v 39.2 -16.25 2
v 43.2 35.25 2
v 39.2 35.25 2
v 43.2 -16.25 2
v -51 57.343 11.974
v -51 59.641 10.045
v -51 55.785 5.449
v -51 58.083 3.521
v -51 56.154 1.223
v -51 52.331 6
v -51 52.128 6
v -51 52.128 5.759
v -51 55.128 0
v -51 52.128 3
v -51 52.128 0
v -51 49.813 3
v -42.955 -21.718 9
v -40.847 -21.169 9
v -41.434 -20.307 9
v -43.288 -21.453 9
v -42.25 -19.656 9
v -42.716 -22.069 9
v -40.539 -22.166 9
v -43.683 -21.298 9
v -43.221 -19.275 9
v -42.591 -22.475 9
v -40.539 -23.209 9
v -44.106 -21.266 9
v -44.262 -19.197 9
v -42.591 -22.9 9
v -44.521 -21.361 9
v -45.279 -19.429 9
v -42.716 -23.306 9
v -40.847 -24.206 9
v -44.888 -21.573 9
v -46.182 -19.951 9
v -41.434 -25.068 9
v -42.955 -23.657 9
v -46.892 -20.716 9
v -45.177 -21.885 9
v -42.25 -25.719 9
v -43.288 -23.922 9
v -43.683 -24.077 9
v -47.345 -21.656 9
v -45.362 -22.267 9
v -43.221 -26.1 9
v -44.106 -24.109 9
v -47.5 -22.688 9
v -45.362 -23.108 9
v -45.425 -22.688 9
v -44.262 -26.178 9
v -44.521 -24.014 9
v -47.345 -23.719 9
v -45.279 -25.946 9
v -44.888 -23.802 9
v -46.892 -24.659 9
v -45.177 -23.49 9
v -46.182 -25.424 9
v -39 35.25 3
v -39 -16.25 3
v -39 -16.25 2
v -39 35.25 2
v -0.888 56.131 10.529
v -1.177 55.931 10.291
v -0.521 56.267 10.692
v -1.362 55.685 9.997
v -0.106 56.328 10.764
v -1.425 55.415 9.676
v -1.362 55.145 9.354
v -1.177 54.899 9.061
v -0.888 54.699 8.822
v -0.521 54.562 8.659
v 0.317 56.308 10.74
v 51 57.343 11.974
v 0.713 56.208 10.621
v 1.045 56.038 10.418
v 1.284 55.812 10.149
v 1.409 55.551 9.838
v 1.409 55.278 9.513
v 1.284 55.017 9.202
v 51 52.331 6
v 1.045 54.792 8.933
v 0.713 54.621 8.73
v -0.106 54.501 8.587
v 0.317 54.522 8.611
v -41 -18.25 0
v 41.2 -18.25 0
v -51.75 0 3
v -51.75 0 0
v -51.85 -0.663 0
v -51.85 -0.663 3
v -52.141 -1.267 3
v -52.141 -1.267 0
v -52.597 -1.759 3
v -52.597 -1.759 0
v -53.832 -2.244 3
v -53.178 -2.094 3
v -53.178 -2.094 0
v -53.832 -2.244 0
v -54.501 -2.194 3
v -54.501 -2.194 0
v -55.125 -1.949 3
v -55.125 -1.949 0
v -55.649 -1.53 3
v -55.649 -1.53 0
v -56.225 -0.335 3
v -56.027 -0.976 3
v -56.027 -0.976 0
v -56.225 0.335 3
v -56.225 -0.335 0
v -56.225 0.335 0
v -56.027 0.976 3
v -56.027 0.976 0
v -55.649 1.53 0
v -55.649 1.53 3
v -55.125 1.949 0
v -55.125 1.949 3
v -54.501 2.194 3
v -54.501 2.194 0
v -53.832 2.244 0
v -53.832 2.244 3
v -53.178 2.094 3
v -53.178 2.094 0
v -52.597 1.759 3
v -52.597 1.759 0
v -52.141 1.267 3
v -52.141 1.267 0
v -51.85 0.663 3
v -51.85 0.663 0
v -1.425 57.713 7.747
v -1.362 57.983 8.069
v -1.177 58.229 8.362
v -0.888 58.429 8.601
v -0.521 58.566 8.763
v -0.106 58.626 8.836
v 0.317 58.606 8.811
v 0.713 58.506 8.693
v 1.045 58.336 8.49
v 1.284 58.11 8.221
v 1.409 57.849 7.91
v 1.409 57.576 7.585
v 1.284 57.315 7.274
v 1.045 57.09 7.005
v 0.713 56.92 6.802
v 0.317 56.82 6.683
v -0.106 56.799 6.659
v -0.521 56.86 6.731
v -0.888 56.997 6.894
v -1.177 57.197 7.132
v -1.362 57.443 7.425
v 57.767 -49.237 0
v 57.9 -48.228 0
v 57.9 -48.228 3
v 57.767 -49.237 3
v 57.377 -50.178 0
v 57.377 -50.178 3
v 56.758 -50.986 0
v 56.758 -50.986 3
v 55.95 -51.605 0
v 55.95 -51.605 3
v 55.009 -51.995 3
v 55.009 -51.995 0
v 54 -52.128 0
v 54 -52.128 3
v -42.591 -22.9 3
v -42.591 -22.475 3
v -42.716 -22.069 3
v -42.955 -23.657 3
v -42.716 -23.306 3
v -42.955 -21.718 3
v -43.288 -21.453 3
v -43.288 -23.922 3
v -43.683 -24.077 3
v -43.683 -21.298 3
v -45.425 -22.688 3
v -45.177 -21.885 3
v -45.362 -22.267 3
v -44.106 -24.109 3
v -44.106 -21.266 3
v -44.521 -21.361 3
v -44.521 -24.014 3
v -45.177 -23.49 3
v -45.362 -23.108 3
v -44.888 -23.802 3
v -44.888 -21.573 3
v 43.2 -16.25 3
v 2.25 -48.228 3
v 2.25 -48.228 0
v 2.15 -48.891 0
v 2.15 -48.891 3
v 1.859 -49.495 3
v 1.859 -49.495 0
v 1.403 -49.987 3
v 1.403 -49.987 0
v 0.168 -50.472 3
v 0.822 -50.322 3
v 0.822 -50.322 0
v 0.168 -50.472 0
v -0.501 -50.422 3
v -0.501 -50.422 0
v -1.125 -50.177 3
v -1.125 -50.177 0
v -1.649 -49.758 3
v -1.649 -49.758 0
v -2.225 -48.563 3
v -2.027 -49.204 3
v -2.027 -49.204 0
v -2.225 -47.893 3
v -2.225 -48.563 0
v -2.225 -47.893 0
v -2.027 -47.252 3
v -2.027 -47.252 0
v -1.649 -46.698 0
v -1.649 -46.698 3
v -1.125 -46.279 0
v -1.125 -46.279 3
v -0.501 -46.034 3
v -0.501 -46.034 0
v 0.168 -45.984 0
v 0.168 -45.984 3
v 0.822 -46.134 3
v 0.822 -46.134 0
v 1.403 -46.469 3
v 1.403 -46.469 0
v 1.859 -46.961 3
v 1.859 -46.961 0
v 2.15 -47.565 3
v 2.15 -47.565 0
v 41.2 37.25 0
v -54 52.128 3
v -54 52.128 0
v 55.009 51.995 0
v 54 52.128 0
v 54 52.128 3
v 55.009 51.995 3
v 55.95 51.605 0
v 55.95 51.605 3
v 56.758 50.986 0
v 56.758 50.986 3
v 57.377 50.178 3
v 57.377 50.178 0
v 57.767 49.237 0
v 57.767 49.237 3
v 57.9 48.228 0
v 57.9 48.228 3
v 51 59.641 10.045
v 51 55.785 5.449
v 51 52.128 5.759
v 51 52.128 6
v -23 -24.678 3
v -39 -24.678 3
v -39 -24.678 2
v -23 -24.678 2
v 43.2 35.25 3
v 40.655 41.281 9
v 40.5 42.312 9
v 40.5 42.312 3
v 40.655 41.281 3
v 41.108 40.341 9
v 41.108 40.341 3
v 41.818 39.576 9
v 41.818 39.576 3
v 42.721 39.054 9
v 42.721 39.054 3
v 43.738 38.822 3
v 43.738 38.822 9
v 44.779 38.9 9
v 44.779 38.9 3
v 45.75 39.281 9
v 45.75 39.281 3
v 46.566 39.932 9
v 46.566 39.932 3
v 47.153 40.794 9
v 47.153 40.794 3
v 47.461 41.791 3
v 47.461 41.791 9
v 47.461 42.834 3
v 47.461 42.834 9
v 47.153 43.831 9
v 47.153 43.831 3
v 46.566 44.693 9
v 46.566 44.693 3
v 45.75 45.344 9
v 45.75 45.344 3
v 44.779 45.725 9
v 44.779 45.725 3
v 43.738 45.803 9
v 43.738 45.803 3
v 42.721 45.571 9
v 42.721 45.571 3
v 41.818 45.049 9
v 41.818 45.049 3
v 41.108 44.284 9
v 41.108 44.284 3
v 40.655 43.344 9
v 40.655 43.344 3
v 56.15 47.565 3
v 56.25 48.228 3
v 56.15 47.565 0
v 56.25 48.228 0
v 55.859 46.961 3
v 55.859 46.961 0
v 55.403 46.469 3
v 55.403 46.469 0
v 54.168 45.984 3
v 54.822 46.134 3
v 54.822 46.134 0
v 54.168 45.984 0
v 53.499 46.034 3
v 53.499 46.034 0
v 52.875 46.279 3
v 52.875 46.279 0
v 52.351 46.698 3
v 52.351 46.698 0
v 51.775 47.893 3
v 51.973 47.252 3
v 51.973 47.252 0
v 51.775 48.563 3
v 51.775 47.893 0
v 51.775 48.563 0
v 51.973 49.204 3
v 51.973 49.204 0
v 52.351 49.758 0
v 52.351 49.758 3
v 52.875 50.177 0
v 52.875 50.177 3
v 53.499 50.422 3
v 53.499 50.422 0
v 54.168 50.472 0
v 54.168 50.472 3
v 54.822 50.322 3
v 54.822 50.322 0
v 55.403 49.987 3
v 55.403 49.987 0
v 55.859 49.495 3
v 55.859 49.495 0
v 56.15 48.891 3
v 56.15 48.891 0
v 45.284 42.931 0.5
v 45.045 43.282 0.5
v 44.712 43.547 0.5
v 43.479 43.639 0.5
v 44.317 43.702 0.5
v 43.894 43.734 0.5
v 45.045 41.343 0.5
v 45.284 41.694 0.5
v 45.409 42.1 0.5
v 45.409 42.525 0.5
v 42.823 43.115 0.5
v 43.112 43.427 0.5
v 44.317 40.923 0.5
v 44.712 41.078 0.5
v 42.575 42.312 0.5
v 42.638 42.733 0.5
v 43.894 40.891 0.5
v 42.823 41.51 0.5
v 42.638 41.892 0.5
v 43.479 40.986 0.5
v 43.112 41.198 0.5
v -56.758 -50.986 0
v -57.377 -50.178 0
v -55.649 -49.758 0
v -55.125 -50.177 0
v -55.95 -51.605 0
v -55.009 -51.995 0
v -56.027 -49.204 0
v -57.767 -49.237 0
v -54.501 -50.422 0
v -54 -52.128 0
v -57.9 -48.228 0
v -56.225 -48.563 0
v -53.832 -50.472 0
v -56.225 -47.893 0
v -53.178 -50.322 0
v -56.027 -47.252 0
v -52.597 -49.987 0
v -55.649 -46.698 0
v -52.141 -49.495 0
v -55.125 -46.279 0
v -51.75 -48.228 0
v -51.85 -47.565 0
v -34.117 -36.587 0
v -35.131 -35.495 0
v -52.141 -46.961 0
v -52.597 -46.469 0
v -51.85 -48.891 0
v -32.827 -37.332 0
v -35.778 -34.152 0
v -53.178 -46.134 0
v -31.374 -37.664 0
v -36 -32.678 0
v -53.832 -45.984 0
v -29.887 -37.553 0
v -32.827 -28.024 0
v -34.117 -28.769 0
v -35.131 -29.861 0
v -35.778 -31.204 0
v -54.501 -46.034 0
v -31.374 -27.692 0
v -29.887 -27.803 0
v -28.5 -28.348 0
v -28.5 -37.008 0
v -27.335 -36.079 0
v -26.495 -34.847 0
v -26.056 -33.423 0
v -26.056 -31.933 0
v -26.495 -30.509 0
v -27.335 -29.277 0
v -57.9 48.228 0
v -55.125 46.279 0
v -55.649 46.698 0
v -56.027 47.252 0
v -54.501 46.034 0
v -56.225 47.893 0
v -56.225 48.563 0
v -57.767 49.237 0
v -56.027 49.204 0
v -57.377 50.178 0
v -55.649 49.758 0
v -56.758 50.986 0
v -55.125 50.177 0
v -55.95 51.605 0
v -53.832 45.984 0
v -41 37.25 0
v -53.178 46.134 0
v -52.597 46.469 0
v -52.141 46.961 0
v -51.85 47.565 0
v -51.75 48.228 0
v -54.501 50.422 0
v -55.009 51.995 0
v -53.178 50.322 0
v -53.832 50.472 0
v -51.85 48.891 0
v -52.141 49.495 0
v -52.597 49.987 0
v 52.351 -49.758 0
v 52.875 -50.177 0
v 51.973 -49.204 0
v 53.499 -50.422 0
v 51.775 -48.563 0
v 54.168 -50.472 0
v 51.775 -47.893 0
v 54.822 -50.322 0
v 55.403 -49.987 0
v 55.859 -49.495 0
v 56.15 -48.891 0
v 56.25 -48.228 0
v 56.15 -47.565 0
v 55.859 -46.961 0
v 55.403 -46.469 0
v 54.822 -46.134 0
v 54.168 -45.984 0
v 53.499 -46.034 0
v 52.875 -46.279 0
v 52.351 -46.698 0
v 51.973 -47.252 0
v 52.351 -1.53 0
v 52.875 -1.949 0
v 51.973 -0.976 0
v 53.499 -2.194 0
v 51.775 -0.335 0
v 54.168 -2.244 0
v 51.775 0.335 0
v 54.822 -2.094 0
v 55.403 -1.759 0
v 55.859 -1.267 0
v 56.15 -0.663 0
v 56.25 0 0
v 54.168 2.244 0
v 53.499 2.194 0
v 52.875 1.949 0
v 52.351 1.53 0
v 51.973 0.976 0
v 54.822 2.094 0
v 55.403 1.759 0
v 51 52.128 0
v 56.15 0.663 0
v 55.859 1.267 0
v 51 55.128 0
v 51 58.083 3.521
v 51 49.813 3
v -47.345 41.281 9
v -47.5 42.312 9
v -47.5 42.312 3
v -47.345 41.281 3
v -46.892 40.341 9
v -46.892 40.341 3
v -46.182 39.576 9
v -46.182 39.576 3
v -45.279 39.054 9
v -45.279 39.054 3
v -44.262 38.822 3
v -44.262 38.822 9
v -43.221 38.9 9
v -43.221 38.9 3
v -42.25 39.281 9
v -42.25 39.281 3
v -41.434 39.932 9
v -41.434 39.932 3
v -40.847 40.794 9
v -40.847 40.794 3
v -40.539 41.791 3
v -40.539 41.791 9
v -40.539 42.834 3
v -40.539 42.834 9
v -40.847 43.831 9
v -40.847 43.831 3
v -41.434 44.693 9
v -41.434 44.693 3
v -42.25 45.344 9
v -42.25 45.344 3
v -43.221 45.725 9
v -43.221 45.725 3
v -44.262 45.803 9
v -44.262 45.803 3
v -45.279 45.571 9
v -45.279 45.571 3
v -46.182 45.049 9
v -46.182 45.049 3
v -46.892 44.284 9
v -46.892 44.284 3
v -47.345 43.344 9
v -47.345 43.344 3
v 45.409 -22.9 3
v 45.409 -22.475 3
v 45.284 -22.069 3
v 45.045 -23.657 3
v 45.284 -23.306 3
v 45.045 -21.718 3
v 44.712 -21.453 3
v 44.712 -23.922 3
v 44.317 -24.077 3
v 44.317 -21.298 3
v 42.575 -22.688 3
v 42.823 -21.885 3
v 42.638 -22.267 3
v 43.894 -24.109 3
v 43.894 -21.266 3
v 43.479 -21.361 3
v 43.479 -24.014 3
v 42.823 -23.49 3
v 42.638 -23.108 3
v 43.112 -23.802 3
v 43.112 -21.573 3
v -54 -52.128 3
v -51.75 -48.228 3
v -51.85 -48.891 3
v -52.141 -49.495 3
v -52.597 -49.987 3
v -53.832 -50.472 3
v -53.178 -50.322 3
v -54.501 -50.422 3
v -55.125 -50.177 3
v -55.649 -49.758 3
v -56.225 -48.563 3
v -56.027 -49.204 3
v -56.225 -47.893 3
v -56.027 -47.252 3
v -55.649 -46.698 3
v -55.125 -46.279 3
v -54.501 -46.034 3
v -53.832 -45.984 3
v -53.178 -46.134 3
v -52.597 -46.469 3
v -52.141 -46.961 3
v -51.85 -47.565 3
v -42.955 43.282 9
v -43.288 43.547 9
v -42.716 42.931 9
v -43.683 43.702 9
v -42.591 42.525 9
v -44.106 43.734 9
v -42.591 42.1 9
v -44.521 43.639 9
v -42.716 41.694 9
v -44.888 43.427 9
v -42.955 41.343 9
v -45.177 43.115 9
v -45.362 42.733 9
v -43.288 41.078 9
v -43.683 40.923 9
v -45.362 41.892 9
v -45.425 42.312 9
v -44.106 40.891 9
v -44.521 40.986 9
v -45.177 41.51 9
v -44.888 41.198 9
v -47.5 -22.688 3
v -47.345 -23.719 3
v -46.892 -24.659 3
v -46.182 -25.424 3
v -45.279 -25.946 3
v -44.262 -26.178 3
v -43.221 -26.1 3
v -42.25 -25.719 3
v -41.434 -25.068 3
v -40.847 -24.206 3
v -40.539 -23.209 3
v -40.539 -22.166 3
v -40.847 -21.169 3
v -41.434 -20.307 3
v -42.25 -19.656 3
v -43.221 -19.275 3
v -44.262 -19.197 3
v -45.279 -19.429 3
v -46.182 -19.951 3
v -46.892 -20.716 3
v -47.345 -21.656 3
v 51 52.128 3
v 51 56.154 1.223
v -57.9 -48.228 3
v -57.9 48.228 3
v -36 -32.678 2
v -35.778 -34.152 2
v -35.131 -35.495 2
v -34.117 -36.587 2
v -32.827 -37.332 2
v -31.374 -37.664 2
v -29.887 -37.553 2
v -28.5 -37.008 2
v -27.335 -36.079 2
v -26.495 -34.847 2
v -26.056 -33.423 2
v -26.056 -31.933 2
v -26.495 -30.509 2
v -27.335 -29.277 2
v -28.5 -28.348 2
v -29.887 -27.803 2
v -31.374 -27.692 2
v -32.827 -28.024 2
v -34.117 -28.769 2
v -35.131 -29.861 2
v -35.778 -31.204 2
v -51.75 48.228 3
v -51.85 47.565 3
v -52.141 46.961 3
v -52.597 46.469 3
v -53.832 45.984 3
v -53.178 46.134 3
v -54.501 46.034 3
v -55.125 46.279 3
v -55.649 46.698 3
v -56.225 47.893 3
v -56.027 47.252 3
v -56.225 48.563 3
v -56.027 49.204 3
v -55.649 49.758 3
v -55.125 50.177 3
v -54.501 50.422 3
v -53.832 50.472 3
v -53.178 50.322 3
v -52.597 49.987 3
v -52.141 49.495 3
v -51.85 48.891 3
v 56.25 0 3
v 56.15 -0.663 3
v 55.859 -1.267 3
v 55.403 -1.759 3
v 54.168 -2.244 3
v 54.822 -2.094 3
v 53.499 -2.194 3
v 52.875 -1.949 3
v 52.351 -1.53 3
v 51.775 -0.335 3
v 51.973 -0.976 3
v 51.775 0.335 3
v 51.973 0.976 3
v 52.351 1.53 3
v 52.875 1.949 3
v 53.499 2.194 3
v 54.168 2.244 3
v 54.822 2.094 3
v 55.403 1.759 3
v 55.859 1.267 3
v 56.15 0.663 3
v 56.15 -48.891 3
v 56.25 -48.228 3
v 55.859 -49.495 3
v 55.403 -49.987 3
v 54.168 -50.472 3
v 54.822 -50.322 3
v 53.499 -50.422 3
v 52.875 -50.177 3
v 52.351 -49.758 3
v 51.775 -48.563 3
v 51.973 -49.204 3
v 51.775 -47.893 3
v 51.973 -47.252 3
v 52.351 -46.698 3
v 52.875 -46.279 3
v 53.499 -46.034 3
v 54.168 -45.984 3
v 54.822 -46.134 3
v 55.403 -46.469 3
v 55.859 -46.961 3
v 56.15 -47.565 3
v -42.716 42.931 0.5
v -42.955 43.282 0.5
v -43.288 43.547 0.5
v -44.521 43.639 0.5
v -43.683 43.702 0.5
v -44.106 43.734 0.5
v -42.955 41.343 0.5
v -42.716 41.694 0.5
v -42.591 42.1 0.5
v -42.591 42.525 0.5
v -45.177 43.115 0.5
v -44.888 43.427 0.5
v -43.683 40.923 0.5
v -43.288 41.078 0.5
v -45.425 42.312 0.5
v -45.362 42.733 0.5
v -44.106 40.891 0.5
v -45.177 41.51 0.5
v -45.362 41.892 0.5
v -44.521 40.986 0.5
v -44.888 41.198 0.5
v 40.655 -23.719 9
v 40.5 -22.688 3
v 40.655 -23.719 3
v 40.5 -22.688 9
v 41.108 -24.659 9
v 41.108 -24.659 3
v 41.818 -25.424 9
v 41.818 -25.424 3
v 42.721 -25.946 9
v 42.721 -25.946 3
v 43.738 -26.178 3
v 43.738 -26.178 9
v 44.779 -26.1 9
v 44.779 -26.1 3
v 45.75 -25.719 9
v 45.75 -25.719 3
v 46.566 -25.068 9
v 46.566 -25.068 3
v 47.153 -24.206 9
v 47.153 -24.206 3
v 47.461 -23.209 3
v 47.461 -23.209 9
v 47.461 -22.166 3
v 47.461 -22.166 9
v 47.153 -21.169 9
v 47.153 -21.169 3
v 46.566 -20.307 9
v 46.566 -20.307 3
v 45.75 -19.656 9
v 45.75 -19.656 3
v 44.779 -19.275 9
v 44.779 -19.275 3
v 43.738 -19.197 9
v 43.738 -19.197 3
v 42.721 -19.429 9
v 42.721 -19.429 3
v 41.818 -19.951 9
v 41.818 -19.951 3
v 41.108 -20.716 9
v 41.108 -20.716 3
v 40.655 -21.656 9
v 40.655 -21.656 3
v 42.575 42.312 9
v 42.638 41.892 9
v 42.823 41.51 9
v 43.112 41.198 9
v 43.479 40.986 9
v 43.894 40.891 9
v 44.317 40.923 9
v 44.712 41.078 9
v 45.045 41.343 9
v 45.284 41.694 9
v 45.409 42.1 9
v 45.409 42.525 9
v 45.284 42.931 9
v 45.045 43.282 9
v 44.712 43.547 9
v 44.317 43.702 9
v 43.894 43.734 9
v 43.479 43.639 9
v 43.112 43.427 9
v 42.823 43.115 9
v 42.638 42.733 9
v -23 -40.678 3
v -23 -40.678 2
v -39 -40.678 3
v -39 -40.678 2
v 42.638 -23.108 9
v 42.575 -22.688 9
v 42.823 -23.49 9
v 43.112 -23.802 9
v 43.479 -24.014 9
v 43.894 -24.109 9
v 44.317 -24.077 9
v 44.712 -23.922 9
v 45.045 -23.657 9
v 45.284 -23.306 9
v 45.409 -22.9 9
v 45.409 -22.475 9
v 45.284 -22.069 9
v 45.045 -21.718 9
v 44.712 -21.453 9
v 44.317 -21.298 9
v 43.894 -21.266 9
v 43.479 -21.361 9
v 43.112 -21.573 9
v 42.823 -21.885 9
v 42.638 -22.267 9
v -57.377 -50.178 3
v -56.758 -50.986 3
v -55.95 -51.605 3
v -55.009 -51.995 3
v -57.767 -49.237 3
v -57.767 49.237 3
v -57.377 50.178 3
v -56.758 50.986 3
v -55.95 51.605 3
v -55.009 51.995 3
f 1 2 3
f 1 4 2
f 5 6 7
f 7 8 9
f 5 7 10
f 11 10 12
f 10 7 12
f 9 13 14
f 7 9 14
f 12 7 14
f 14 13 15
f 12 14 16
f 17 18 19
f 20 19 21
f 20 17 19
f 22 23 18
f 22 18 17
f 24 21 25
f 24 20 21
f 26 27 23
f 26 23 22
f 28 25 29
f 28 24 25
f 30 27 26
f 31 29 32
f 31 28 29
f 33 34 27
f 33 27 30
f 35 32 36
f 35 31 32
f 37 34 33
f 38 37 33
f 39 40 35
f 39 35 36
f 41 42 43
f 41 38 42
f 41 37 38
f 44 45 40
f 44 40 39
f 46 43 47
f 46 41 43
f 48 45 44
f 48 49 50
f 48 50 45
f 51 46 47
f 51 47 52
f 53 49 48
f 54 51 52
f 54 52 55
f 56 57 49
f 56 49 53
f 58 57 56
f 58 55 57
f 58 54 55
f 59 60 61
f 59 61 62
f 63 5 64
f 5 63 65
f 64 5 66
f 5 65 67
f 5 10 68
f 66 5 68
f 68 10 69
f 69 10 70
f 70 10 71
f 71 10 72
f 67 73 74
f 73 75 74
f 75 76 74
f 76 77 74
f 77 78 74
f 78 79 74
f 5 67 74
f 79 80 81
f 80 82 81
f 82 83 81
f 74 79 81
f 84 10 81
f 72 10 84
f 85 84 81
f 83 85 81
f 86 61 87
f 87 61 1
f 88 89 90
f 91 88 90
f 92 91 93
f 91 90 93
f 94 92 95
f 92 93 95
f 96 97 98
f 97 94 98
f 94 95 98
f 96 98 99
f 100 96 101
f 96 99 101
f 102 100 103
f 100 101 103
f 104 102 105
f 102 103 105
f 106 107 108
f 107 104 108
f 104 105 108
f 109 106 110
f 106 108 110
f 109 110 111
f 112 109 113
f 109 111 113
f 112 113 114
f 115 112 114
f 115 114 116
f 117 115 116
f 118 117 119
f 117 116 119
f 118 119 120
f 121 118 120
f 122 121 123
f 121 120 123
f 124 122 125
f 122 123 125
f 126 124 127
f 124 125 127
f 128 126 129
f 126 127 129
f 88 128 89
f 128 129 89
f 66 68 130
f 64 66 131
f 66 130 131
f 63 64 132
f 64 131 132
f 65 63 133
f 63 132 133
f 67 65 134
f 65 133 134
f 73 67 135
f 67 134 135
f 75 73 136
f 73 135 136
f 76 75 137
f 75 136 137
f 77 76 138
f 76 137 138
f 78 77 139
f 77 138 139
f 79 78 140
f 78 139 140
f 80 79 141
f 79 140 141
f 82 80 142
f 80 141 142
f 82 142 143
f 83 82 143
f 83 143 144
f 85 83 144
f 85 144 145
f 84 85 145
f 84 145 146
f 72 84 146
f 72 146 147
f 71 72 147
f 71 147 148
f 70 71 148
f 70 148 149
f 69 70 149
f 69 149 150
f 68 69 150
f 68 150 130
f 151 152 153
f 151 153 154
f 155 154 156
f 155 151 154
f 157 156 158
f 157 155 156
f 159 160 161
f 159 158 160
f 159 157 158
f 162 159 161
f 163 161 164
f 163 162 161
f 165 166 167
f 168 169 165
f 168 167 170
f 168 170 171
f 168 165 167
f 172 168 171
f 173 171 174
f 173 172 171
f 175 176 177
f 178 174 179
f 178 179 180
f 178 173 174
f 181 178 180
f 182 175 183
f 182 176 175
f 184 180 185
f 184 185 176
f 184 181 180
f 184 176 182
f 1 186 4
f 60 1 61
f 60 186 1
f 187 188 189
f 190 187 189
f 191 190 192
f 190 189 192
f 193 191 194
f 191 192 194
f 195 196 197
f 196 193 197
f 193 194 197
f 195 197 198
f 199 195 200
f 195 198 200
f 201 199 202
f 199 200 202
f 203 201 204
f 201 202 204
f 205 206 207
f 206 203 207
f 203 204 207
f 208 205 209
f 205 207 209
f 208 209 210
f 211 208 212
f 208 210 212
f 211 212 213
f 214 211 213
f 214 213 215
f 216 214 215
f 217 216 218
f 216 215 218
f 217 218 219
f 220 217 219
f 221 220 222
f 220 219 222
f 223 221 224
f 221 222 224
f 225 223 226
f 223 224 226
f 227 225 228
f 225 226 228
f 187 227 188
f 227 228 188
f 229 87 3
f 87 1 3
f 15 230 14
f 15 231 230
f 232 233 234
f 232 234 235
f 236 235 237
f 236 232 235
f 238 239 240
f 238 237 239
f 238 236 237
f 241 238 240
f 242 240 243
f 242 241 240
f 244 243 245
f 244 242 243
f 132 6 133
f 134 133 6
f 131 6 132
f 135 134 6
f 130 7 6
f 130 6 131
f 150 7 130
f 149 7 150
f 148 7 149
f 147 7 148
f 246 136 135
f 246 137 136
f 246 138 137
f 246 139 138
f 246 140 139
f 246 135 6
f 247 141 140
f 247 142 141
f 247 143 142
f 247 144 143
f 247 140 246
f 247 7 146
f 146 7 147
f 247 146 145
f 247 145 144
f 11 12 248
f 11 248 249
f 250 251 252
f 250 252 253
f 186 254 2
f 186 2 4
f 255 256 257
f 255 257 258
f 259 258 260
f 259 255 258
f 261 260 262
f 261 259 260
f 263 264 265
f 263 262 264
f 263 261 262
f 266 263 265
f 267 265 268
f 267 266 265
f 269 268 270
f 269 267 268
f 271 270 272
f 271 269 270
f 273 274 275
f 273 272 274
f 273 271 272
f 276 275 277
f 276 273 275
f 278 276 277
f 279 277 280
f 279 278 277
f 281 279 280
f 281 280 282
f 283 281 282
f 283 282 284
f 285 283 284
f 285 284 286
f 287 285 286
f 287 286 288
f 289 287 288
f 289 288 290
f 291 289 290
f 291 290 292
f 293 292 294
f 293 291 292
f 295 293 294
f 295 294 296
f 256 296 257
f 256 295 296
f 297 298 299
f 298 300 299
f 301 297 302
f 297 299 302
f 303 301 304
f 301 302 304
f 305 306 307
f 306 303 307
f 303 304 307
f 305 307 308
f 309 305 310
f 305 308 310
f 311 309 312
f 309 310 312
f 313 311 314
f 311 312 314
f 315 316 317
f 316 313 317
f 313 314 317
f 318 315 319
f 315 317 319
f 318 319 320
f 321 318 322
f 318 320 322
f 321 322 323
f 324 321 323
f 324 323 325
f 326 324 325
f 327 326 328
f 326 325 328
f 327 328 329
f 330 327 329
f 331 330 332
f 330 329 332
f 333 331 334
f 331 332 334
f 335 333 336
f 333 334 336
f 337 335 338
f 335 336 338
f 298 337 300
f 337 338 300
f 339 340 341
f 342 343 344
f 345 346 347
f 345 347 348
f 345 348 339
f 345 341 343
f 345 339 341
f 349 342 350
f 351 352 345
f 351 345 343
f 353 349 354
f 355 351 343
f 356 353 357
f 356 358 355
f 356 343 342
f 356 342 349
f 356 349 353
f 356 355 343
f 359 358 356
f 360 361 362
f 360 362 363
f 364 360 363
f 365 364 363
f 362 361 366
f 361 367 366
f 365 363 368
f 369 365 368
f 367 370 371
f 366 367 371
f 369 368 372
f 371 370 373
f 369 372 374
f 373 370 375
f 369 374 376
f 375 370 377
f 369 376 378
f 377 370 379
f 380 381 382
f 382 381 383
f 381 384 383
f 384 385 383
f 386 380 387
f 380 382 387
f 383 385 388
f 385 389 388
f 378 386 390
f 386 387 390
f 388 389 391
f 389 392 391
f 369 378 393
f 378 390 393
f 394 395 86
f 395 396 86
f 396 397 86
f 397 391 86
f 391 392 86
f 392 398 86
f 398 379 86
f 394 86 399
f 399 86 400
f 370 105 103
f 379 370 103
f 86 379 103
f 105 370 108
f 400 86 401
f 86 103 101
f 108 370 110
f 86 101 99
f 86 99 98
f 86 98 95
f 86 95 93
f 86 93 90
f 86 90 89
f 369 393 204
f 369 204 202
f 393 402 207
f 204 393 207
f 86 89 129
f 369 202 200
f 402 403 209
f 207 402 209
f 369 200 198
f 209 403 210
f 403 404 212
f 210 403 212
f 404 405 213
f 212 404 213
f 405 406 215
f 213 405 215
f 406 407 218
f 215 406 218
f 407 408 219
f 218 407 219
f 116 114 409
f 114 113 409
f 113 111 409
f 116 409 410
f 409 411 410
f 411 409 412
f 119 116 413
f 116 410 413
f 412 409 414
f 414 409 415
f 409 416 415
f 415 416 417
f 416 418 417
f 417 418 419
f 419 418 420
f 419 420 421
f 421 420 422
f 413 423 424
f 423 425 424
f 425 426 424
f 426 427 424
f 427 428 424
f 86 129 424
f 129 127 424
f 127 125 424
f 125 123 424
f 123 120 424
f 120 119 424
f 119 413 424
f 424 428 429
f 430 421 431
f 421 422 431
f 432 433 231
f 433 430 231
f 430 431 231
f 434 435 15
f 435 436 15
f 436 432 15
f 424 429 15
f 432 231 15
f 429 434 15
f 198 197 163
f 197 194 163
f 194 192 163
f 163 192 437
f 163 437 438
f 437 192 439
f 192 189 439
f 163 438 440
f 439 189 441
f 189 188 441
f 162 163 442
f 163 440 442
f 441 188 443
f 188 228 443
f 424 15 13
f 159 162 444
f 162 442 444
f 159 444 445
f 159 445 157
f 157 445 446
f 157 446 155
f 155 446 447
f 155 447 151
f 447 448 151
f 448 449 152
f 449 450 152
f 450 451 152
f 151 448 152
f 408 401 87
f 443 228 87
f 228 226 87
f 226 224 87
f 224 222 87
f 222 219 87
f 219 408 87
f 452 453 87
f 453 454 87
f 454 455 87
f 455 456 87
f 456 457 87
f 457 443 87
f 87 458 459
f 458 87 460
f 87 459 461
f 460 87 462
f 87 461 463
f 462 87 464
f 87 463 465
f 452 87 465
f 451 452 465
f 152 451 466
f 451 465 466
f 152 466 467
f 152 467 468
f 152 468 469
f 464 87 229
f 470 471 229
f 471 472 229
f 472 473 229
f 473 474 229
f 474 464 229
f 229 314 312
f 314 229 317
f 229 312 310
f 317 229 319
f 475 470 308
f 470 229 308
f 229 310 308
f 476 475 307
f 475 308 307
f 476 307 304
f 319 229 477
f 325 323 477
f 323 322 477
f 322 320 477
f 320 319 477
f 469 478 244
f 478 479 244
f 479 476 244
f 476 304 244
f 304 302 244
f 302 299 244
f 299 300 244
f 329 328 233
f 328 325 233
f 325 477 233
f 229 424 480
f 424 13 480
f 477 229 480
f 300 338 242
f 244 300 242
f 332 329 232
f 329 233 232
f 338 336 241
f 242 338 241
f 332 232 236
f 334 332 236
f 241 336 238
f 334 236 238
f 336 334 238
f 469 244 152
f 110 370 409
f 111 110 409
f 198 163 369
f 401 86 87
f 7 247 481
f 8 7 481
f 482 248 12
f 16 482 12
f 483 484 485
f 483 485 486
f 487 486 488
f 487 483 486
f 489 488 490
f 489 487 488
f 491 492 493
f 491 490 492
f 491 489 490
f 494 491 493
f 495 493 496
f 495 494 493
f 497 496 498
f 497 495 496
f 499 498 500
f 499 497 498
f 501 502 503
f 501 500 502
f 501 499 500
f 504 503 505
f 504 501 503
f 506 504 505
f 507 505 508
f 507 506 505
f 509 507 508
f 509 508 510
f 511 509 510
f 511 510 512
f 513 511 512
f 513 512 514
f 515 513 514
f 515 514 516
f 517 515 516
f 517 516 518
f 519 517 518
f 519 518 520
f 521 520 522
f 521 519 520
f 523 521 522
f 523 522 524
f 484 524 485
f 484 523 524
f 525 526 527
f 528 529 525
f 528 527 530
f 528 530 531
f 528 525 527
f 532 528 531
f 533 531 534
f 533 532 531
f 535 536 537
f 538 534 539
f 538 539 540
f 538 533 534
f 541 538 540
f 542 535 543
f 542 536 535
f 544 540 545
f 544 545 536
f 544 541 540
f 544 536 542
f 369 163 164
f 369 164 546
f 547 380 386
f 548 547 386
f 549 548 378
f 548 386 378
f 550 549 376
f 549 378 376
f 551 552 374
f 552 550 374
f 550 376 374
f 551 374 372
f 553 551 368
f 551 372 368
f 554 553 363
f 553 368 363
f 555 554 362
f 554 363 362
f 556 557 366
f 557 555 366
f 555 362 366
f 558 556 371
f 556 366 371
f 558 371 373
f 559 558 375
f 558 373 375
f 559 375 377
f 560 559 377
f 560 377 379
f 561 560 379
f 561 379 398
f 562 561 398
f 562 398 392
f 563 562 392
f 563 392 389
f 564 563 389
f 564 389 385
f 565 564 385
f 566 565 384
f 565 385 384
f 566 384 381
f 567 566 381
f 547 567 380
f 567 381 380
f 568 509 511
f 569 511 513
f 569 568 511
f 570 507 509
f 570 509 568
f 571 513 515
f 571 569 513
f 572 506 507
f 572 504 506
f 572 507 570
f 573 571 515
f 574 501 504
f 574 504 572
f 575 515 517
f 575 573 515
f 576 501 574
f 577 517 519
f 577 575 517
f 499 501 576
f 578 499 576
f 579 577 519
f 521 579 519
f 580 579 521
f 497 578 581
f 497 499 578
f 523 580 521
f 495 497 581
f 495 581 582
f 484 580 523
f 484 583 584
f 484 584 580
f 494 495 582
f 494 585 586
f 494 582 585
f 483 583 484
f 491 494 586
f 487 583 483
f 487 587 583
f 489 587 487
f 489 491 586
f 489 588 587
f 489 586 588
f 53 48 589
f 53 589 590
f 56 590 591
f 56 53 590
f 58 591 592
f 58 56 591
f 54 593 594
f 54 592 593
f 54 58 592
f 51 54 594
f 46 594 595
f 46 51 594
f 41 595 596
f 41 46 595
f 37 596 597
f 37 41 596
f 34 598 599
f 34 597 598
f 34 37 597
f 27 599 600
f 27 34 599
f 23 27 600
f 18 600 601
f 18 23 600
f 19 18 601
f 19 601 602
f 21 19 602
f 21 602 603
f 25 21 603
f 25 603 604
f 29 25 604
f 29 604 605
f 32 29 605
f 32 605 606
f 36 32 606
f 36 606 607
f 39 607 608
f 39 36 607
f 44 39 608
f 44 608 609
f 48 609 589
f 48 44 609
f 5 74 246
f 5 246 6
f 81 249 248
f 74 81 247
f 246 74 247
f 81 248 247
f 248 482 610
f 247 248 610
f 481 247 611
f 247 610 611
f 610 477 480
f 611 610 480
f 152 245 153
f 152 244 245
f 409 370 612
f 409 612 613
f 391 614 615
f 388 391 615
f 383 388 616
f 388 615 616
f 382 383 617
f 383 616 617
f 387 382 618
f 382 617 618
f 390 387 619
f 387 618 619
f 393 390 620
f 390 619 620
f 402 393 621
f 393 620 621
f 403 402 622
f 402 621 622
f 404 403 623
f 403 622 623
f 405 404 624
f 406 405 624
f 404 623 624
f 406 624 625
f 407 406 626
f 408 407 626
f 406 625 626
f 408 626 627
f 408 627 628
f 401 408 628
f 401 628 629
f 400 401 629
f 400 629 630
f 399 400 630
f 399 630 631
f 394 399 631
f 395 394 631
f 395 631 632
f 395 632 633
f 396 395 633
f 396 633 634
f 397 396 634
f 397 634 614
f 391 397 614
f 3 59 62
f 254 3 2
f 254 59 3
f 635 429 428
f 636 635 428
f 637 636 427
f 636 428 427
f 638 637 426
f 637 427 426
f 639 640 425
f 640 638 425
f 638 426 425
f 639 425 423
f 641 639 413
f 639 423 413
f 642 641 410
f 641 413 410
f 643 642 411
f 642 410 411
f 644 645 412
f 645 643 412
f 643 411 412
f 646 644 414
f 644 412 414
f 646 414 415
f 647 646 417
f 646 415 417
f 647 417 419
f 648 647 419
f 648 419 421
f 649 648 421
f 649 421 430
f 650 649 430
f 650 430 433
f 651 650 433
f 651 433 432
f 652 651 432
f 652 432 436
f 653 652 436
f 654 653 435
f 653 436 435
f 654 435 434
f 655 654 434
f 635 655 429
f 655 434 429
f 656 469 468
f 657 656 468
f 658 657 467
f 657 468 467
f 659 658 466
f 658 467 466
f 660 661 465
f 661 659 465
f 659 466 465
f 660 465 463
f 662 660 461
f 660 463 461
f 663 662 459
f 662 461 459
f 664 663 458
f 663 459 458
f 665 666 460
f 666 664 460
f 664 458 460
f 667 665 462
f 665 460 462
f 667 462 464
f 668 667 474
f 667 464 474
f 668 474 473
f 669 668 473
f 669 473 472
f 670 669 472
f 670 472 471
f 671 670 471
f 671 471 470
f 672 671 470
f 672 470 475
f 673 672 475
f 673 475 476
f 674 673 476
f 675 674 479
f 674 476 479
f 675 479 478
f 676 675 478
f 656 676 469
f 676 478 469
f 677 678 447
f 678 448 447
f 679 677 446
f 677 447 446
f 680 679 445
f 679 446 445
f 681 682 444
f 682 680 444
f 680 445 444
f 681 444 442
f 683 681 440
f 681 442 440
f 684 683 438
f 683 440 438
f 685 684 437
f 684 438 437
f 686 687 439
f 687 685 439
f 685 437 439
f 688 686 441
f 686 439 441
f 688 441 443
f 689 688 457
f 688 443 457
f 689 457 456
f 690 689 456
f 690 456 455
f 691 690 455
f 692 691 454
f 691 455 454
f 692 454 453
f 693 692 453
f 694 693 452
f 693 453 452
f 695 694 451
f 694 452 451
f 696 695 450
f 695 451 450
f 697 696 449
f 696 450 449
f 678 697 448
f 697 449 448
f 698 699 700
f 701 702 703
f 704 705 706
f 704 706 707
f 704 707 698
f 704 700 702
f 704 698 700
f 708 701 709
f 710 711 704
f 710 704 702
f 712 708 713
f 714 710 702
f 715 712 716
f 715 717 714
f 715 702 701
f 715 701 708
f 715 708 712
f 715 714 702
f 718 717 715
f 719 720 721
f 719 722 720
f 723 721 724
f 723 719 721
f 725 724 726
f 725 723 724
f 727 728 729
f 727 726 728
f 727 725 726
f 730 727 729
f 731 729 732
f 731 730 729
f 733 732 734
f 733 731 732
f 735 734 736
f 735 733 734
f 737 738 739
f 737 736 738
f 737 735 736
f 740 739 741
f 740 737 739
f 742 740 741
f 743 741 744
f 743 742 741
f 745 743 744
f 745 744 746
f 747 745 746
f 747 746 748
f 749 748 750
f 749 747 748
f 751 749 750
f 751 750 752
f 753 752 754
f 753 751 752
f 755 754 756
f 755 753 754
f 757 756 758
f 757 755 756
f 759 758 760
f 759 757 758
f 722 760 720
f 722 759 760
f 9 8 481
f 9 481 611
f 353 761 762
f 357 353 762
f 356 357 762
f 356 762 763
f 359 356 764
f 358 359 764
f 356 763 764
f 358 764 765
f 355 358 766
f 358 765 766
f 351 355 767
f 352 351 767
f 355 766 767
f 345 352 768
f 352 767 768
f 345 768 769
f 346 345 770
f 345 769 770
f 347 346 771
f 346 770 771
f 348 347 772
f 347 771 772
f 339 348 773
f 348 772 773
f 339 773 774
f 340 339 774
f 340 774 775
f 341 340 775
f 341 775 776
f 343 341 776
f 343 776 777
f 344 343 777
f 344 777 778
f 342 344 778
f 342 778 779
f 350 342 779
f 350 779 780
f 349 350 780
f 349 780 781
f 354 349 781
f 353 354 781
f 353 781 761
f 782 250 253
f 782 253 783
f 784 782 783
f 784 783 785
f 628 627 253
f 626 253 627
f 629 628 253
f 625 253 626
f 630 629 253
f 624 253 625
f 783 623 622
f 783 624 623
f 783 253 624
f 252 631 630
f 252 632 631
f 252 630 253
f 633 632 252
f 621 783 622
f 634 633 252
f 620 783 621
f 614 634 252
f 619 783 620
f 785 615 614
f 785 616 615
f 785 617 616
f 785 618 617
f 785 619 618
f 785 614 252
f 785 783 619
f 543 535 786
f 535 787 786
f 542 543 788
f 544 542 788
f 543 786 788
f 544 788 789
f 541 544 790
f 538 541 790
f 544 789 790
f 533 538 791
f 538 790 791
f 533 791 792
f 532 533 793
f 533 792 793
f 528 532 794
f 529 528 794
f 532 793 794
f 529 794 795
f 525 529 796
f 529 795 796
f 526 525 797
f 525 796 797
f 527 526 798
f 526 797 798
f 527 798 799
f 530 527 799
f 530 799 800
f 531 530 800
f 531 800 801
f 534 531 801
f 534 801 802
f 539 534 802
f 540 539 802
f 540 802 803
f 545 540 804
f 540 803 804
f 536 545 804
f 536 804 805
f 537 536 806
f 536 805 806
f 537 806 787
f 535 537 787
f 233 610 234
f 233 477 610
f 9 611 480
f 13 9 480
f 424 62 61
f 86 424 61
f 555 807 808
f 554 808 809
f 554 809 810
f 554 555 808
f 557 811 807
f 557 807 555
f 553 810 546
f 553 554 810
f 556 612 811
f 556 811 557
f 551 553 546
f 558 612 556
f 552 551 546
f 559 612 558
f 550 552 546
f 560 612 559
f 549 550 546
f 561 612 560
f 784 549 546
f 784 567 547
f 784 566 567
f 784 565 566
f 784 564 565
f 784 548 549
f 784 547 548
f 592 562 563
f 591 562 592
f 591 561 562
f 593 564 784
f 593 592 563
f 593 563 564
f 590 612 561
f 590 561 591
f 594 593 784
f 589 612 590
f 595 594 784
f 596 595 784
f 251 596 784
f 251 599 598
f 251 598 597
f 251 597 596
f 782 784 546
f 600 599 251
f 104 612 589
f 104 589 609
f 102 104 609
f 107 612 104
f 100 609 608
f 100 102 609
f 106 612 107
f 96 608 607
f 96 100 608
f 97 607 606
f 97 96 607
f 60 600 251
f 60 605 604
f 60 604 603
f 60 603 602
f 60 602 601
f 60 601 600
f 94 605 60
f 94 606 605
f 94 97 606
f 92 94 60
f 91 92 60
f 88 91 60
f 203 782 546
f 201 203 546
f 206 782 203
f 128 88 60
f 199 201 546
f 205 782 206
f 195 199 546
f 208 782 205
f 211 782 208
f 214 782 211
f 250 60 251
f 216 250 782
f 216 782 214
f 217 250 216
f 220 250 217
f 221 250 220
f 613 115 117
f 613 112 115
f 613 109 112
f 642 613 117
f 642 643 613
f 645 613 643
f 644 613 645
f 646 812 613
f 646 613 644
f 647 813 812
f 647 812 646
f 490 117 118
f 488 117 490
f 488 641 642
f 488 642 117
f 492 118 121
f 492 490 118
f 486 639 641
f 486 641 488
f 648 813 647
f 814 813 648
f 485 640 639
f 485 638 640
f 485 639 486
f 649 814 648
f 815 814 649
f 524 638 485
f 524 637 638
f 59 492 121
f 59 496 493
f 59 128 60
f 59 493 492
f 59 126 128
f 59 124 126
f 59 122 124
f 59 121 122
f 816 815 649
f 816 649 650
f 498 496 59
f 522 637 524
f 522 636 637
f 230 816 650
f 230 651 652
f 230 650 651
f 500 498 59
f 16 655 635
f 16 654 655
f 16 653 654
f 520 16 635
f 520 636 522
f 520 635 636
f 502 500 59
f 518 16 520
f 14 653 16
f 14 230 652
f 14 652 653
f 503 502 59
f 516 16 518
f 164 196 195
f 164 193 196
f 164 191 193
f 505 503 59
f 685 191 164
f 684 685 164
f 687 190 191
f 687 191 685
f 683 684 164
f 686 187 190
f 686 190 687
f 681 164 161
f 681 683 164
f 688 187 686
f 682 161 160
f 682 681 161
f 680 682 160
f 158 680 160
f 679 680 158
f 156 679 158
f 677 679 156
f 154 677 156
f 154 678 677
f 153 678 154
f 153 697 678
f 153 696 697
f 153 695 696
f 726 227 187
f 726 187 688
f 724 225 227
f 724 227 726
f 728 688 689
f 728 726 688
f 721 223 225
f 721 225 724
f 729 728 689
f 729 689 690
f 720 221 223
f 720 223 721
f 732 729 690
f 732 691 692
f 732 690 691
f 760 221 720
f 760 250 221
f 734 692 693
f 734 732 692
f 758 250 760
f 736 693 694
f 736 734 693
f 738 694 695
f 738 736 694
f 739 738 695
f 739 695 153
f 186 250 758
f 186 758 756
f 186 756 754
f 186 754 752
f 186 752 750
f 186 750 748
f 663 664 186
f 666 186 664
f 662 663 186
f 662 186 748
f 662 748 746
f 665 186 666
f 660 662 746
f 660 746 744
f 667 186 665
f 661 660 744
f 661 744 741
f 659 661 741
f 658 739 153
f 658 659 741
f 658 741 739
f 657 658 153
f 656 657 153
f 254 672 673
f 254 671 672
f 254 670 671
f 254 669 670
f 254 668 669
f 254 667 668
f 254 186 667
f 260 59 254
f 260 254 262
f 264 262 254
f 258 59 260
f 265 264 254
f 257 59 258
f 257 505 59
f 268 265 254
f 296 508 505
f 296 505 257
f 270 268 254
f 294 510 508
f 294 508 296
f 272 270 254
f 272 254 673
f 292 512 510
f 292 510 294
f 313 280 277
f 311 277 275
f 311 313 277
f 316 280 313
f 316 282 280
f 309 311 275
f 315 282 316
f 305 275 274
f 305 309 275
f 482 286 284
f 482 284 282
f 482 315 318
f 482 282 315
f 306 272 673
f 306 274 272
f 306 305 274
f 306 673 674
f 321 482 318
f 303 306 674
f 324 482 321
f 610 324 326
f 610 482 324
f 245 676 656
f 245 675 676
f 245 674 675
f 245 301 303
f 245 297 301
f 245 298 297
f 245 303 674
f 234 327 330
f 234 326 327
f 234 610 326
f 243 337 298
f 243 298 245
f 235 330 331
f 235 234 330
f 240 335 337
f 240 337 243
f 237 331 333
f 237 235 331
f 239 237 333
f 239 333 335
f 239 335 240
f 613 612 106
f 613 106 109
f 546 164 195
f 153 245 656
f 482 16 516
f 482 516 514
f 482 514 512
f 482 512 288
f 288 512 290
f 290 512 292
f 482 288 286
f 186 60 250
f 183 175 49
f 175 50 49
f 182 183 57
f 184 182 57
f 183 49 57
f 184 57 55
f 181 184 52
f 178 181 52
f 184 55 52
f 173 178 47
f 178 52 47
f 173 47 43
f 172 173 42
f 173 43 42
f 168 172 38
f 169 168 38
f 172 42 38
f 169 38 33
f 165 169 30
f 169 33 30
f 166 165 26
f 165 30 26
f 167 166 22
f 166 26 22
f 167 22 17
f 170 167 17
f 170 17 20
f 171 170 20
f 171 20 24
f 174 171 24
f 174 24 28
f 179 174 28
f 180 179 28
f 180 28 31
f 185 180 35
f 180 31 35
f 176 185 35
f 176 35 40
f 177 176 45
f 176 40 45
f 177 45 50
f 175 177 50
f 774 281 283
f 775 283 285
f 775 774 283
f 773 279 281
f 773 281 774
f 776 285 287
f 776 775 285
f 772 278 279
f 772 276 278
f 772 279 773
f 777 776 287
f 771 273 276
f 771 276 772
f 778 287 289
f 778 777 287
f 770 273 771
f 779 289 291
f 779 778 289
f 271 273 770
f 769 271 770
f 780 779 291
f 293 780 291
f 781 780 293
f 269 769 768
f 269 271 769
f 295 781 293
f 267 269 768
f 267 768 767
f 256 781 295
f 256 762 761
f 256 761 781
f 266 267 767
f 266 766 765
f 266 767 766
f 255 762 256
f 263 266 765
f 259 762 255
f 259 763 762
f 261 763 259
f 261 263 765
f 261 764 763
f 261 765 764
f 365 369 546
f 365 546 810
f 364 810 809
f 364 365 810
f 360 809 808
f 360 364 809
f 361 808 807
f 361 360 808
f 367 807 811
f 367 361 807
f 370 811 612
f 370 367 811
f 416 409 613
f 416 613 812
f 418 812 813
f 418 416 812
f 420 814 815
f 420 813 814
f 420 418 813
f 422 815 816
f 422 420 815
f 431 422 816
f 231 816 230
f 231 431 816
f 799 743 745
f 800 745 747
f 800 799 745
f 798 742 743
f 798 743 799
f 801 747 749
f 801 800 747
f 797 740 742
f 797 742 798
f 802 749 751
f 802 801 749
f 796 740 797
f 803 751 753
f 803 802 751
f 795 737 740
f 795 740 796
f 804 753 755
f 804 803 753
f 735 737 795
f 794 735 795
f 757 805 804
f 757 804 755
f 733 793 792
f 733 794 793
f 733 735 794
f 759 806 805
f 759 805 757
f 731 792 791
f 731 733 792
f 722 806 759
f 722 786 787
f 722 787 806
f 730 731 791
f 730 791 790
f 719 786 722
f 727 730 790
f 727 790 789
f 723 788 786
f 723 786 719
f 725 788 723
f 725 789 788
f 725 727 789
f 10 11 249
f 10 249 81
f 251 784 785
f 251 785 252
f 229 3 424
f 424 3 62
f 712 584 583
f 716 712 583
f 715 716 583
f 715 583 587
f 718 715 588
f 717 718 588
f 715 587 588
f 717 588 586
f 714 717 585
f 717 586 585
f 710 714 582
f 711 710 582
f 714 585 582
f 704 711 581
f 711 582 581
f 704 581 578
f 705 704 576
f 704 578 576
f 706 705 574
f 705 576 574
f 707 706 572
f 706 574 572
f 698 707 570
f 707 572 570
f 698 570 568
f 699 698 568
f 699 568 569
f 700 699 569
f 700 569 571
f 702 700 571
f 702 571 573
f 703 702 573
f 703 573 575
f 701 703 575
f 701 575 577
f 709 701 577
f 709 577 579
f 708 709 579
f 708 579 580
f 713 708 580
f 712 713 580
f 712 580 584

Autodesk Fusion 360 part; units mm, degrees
sketch "Sketch1" plane through (0, 0, 0) normal (0, 0, 1) x (1, 0, 0)
  line L0 (-57.9, 52.128) -> (57.9, 52.128)
  line L1 (57.9, 52.128) -> (57.9, -52.128)
  line L2 (57.9, -52.128) -> (-57.9, -52.128)
  line L3 (-57.9, -52.128) -> (-57.9, 52.128)
  circle A0 centre (-54, 48.228) radius 3.9
  circle A1 centre (-54, 0) radius 2.25
  circle A2 centre (-54, -48.228) radius 3.9
  circle A3 centre (0, -48.228) radius 2.25
  circle A4 centre (54, -48.228) radius 3.9
  circle A5 centre (54, 0) radius 2.25
  circle A6 centre (54, 48.228) radius 3.9
  circle A7 centre (-54, 48.228) radius 2.25
  circle A8 centre (-54, -48.228) radius 2.25
  circle A9 centre (54, -48.228) radius 2.25
  circle A10 centre (54, 48.228) radius 2.25
  point P0 (0, 52.128)
  point P1 (-57.9, 0)
  dimension "d1" = 115.8
  dimension "d2" = 104.256
  dimension "d3" = 7.8
  dimension "d4" = 7.8
  dimension "d5" = 7.8
  dimension "d6" = 7.8
  dimension "d7" = 4.5
  dimension "d8" = 4.5
  dimension "d9" = 4.5
  dimension "d10" = 4.5
  dimension "d11" = 4.5
  dimension "d12" = 4.5
  dimension "d13" = 4.5
  dimension "d14" = 48.128
  dimension "d15" = 96.256
  dimension "d16" = 53.9
  dimension "d17" = 107.8
extrude "Extrude1" add sketch "Sketch1" along normal blind 3 contours L0 L1 L2 L3 A0 A2 A4 A6 | A0 | A6 | A2 | A4
sketch "Sketch2" plane through (0, 0, 0) normal (1, 0, 0) x (0, 1, 0)
  line L0 (-2.25, 3) -> (2.25, 3)
  line L1 (-50.478, 3) -> (-45.978, 3)
  line L2 (-2.25, 3) -> (2.25, 3)
  line L3 (45.978, 3) -> (50.478, 3)
  line L4 (-50.478, 3) -> (-45.978, 3)
  line L5 (45.978, 3) -> (50.478, 3)
  line L6 (-50.478, 3) -> (-45.978, 3)
  line L7 (-48.228, 3) -> (-52.128, 3)
  line L8 (-48.228, 3) -> (48.228, 3)
  line L9 (52.128, 3) -> (48.228, 3)
  line L10 (52.128, 3) -> (48.228, 3)
  line L11 (48.228, 3) -> (-48.228, 3)
  line L12 (-48.228, 3) -> (-52.128, 3)
  line L13 (52.128, 0) -> (52.128, 3)
  line L14 (52.128, 3) -> (52.128, 0)
  line L15 (-2.25, 0) -> (2.25, 0)
  line L16 (-50.478, 0) -> (-45.978, 0)
  line L17 (-2.25, 0) -> (2.25, 0)
  line L18 (45.978, 0) -> (50.478, 0)
  line L19 (-50.478, 0) -> (-45.978, 0)
  line L20 (45.978, 0) -> (50.478, 0)
  line L21 (-50.478, 0) -> (-45.978, 0)
  line L22 (-48.228, 0) -> (-52.128, 0)
  line L23 (-48.228, 0) -> (-52.128, 0)
  line L24 (-48.228, 0) -> (48.228, 0)
  line L25 (52.128, 0) -> (48.228, 0)
  line L26 (52.128, 0) -> (48.228, 0)
  line L27 (48.228, 0) -> (-48.228, 0)
  line L28 (52.128, 3) -> (52.128, 6)
  line L29 (52.128, 6) -> (55.128, 6)
  line L30 (55.128, 6) -> (58.0826, 3.5208)
  line L31 (58.0826, 3.5208) -> (56.1543, 1.2226)
  line L32 (56.1543, 1.2226) -> (62.2826, -3.9197)
  line L33 (62.2826, -3.9197) -> (61.2567, -5.1423)
  line L34 (61.2567, -5.1423) -> (55.1284, 0)
  line L35 (56.1543, 1.2226) -> (55.1284, 0)
  line L36 (55.1284, 0) -> (52.128, 0)
  dimension "d20" = 3
  dimension "d21" = 3
  dimension "d22" = 140
  dimension "d24" = 3.857
  dimension "d26" = 3
  dimension "d27" = 8
  dimension "d28" = 1.596
extrude "Extrude2" add sketch "Sketch2" along normal mid plane 102 contours L13 L14 L28 L29 L30 L31 L35 L36
sketch "Sketch1 (2)" plane through (0, 25.732, 30.6662) normal (0, 0.642788, 0.766044) x (-1, 0, 0)
  line L0 (51, -38.3738) -> (-51, -38.3738)
  line L1 (-51, -38.3738) -> (-51, -42.2308)
  line L2 (-51, -42.2308) -> (51, -42.2308)
  line L3 (51, -42.2308) -> (51, -38.3738)
  line L4 (51, -39.2308) -> (-51, -39.2308)
  line L5 (-51, -39.2308) -> (-51, -36.2308)
  line L6 (-51, -36.2308) -> (51, -36.2308)
  line L7 (51, -36.2308) -> (51, -39.2308)
  dimension "d67" = 3
  dimension "d68" = 3
extrude "Extrude4" add sketch "Sketch1 (2)" against normal blind 7 contours L0 L1 L3 L4 L5 L7 | L0 L5 L6 L7
sketch "Sketch2 (2)" plane through (0, 25.732, 30.6662) normal (0, 0.642788, 0.766044) x (-1, 0, 0)
  line L0 (-51, -36.2308) -> (-51, -42.2308)
  line L1 (-51, -42.2308) -> (51, -42.2308)
  line L2 (51, -42.2308) -> (51, -36.2308)
  line L3 (51, -36.2308) -> (-51, -36.2308)
  line L4 (51, -39.2308) -> (-51, -39.2308)
  line L5 (-51, -39.2308) -> (-51, -36.2308)
  line L6 (-51, -36.2308) -> (51, -36.2308)
  line L7 (51, -36.2308) -> (51, -39.2308)
  dimension "d71" = 3
extrude "Extrude5" add sketch "Sketch2 (2)" along normal blind 6 contours L0 L2 L3 L4 L5 L6 L7
sketch "Sketch3" plane through (0, 30.0525, -25.2171) normal (0, 0.766044, -0.642788) x (-1, 0, 0)
  line L0 (-51, 40.0319) -> (51, 40.0319)
  line L1 (51, 40.0319) -> (51, 46.0319)
  line L2 (51, 46.0319) -> (-51, 46.0319)
  line L3 (-51, 46.0319) -> (-51, 40.0319)
  circle A0 centre (0, 43.0319) radius 1.425
  dimension "d74" = 2.85
  dimension "d75" = 3
extrude "Extrude6" cut sketch "Sketch3" against normal blind 4 contours A0
sketch "Sketch5" plane through (0, 0, 3) normal (0, 0, 1) x (-1, 0, 0)
  line L0 (-51, -52.128) -> (-51, -49.8132)
  line L1 (-51, -49.8132) -> (51, -49.8132)
  line L2 (51, -49.8132) -> (51, -52.128)
  line L3 (51, -52.128) -> (54, -52.128)
  arc A0 (54, -52.128) -> (57.9, -48.228) centre (54, -48.228) ccw
  line L4 (57.9, -48.228) -> (57.9, 48.228)
  arc A1 (57.9, 48.228) -> (54, 52.128) centre (54, 48.228) ccw
  line L5 (54, 52.128) -> (-54, 52.128)
  arc A2 (-54, 52.128) -> (-57.9, 48.228) centre (-54, 48.228) ccw
  line L6 (-57.9, 48.228) -> (-57.9, -48.228)
  arc A3 (-57.9, -48.228) -> (-54, -52.128) centre (-54, -48.228) ccw
  line L7 (-54, -52.128) -> (-51, -52.128)
  circle A4 centre (-54, 48.228) radius 2.25
  circle A5 centre (-54, -48.228) radius 2.25
  circle A6 centre (54, 48.228) radius 2.25
  circle A7 centre (54, -48.228) radius 2.25
  circle A8 centre (54, 0) radius 2.25
  circle A9 centre (0, 48.228) radius 2.25
  circle A10 centre (-54, 0) radius 2.25
  line L8 (49.9, -44.128) -> (-49.9, -44.128)
  line L9 (-49.9, -44.128) -> (-49.9, 44.128)
  line L10 (-49.9, 44.128) -> (49.9, 44.128)
  line L11 (49.9, 44.128) -> (49.9, -44.128)
  dimension "d84" = 8
  dimension "d85" = 8
  dimension "d86" = 8
  dimension "d87" = 8
extrude "Extrude7" add sketch "Sketch5" along normal blind 6 contours L8 L9 L10 L11
fillet "Fillet1" radius 3 4 edges at (-49.9, -44.128, 6) (-49.9, 44.128, 6) (49.9, -44.128, 6) (49.9, 44.128, 6)
sketch "Sketch4" plane through (0, 0, 9) normal (0, 0, 1) x (-1, 0, 0)
  line L0 (-51, -52.128) -> (-51, -49.8132)
  line L1 (-51, -49.8132) -> (51, -49.8132)
  line L2 (51, -49.8132) -> (51, -52.128)
  line L3 (51, -52.128) -> (54, -52.128)
  arc A0 (54, -52.128) -> (57.9, -48.228) centre (54, -48.228) ccw
  line L4 (57.9, -48.228) -> (57.9, 48.228)
  arc A1 (57.9, 48.228) -> (54, 52.128) centre (54, 48.228) ccw
  line L5 (54, 52.128) -> (-54, 52.128)
  arc A2 (-54, 52.128) -> (-57.9, 48.228) centre (-54, 48.228) ccw
  line L6 (-57.9, 48.228) -> (-57.9, -48.228)
  arc A3 (-57.9, -48.228) -> (-54, -52.128) centre (-54, -48.228) ccw
  line L7 (-54, -52.128) -> (-51, -52.128)
  circle A4 centre (-54, 48.228) radius 2.25
  circle A5 centre (-54, -48.228) radius 2.25
  circle A6 centre (54, 48.228) radius 2.25
  circle A7 centre (54, -48.228) radius 2.25
  circle A8 centre (54, 0) radius 2.25
  circle A9 centre (0, 48.228) radius 2.25
  circle A10 centre (-54, 0) radius 2.25
  line L8 (0, -78.513) -> (0, 73.0042) construction
  line L9 (78.1431, -3) -> (75.8671, -3)
  line L10 (75.8671, -3) -> (-80.0089, -3) construction
  line L11 (47.5, -50.3125) -> (-47.5, -50.3125)
  line L12 (-47.5, -50.3125) -> (-47.5, 44.3125)
  line L13 (-47.5, 44.3125) -> (47.5, 44.3125)
  line L14 (47.5, 44.3125) -> (47.5, -50.3125)
  line L15 (39, -35.25) -> (-39.2, -35.25)
  line L16 (-39.2, -35.25) -> (-39.2, 16.25)
  line L17 (-39.2, 16.25) -> (39, 16.25)
  line L18 (39, 16.25) -> (39, -35.25)
  line L19 (49.9, 41.128) -> (49.9, -41.128)
  arc A11 (46.9, -44.128) -> (49.9, -41.128) centre (46.9, -41.128) ccw
  line L20 (46.9, -44.128) -> (-46.9, -44.128)
  arc A12 (-49.9, -41.128) -> (-46.9, -44.128) centre (-46.9, -41.128) ccw
  line L21 (-49.9, -41.128) -> (-49.9, 41.128)
  arc A13 (-46.9, 44.128) -> (-49.9, 41.128) centre (-46.9, 41.128) ccw
  line L22 (-46.9, 44.128) -> (46.9, 44.128)
  arc A14 (49.9, 41.128) -> (46.9, 44.128) centre (46.9, 41.128) ccw
  arc A15 (-49.9, -41.128) -> (-46.9, -44.128) centre (-46.9, -41.128) ccw
  line L23 (-46.9, -44.128) -> (46.9, -44.128)
  arc A16 (46.9, -44.128) -> (49.9, -41.128) centre (46.9, -41.128) ccw
  line L24 (49.9, -41.128) -> (49.9, 41.128)
  arc A17 (49.9, 41.128) -> (46.9, 44.128) centre (46.9, 41.128) ccw
  line L25 (46.9, 44.128) -> (-46.9, 44.128)
  arc A18 (-46.9, 44.128) -> (-49.9, 41.128) centre (-46.9, 41.128) ccw
  line L26 (-49.9, 41.128) -> (-49.9, -41.128)
  circle A19 centre (44, -42.3125) radius 1.425
  circle A20 centre (44, -42.3125) radius 2.5 construction
  circle A21 centre (44, -42.3125) radius 3.5
  circle A22 centre (-44, -42.3125) radius 1.425
  circle A23 centre (-44, -42.3125) radius 2.5 construction
  circle A24 centre (-44, -42.3125) radius 3.5
  line L27 (40.5, -50.3125) -> (40.5, -42.3125)
  line L28 (44, -38.8125) -> (47.5, -38.8125)
  line L29 (-40.5, -42.3125) -> (-40.5, -45.727)
  line L30 (-40.5, -45.727) -> (-40.5, -50.3125)
  line L31 (-44, -38.8125) -> (-44.8157, -38.8125)
  line L32 (-44.8157, -38.8125) -> (-47.5, -38.8125)
  circle A25 centre (44, 22.6875) radius 1.425
  circle A26 centre (44, 22.6875) radius 2.5 construction
  circle A27 centre (44, 22.6875) radius 3.5
  circle A28 centre (-44, 22.6875) radius 1.425
  circle A29 centre (-44, 22.6875) radius 2.5 construction
  circle A30 centre (-44, 22.6875) radius 3.5
  line L33 (41.5251, 25.1624) -> (47.5, 31.1372)
  line L34 (41.5251, 25.1624) -> (50.2544, 25.1624) construction
  line L35 (41.5251, 20.2126) -> (47.5, 14.2378)
  line L36 (41.5251, 20.2126) -> (51.4571, 20.2126) construction
  line L37 (-41.5251, 25.1624) -> (-47.5, 31.1372)
  line L38 (-41.5251, 20.2126) -> (-47.5, 14.2378)
  circle A31 centre (31, 32.678) radius 5
  line L39 (39, 24.678) -> (23, 24.678)
  line L40 (23, 24.678) -> (23, 40.678)
  line L41 (23, 40.678) -> (39, 40.678)
  line L42 (39, 40.678) -> (39, 24.678)
  line L43 (39, 24.678) -> (23, 40.678) construction
  point P0 (0, -50.3125)
  dimension "d78" = 95
  dimension "d79" = 94.625
  dimension "d80" = 39
  dimension "d81" = 78.2
  dimension "d82" = 19.25
  dimension "d83" = 51.5
  dimension "d92" = 47.3125
  dimension "d93" = 47.3125
  dimension "d94" = 14.0625
  dimension "d95" = 3
  dimension "d96" = 2.85
  dimension "d97" = 5
  dimension "d98" = 7
  dimension "d99" = 8
  dimension "d100" = 2.85
  dimension "d101" = 5
  dimension "d103" = 7
  dimension "d104" = 2.85
  dimension "d105" = 5
  dimension "d106" = 7
  dimension "d107" = 2.85
  dimension "d108" = 5
  dimension "d109" = 7
  dimension "d110" = 65
  dimension "d111" = 45
  dimension "d113" = 45
  dimension "d115" = 45
  dimension "d116" = 45
  dimension "d117" = 10
  dimension "d118" = 16
  dimension "d119" = 16
  dimension "d120" = 16.5
  dimension "d121" = 11.45
extrude "Extrude9" cut sketch "Sketch4" against normal blind 8.5 contours A19 | A22
extrude "Extrude8" add sketch "Sketch4" against normal blind 8 contours L20 A12 A15 L23 A24 | A11 L20 L23 A16 A21 picked at (-43.0708, -44.2671) picked at (43.0708, -44.2671)
extrude "Extrude10" cut sketch "Sketch4" against normal blind 10 contours L15 L16 L17 L18
extrude "Extrude11" cut sketch "Sketch4" against normal up to surface (6 mm away) contours A25 | A28
extrude "Extrude13" cut sketch "Sketch4" against normal blind 7 contours L39 L40 L41 L42
extrude "Extrude14" cut sketch "Sketch4" against normal through all contours A31
extrude "Extrude15" cut sketch "Sketch4" against normal blind 6 contours L12 A12 L21 A13 A15 A18 L26 | L12 A12 A15 A24 | L12 A24 L31 L32 | L20 L23 A21 L27 | L12 L14 L20 A13 L22 A14 L23 A17 L25 A18 A21 A24 L27 L28 L29 L31 L32 A27 A30 L33 L35 L37 L38 | L20 L23 A24 L29 | L14 A11 A16 A21 | L14 L19 A11 A14 A16 L24 A17 | L12 A30 L38 | L14 A21 L28 | L12 A30 L37 | L14 A27 L35 | L14 A27 L33
chamfer "Chamfer1" distance 2 angle 45 4 edges at (39.2, 9.5, 0) (0.1, 35.25, 0) (-39, 9.5, 0) (0.1, -16.25, 0)
sketch "Sketch6" plane through (0, 0, 3) normal (0, 0, 1) x (-1, 0, 0)
  line L0 (-51, -52.128) -> (-51, -49.8132)
  line L1 (-51, -49.8132) -> (51, -49.8132)
  line L2 (51, -49.8132) -> (51, -52.128)
  line L3 (51, -52.128) -> (54, -52.128)
  arc A0 (54, -52.128) -> (57.9, -48.228) centre (54, -48.228) ccw
  line L4 (57.9, -48.228) -> (57.9, 48.228)
  arc A1 (57.9, 48.228) -> (54, 52.128) centre (54, 48.228) ccw
  line L5 (54, 52.128) -> (-54, 52.128)
  arc A2 (-54, 52.128) -> (-57.9, 48.228) centre (-54, 48.228) ccw
  line L6 (-57.9, 48.228) -> (-57.9, -48.228)
  arc A3 (-57.9, -48.228) -> (-54, -52.128) centre (-54, -48.228) ccw
  circle A4 centre (-54, 48.228) radius 2.25
  circle A5 centre (-54, -48.228) radius 2.25
  circle A6 centre (54, 48.228) radius 2.25
  circle A7 centre (54, -48.228) radius 2.25
  circle A8 centre (54, 0) radius 2.25
  circle A9 centre (0, 48.228) radius 2.25
  circle A10 centre (-54, 0) radius 2.25
  line L7 (-39.2, -35.25) -> (-43.2, -35.25)
  line L8 (-43.2, -35.25) -> (-43.2, 16.25)
  line L9 (-43.2, 16.25) -> (-39.2, 16.25)
  line L10 (-39.2, 16.25) -> (-39.2, -35.25)
  circle A11 centre (-44, -42.3125) radius 3.5
  circle A12 centre (-44, 22.6875) radius 3.5
  line L11 (-39.2, 16.25) -> (39, 16.25)
  line L12 (39, 16.25) -> (39, -35.25)
  line L13 (39, -35.25) -> (-39.2, -35.25)
  line L14 (-39.2, -35.25) -> (-39.2, 16.25)
  circle A13 centre (44, 22.6875) radius 3.5
  line L15 (23, 40.678) -> (39, 40.678)
  line L16 (39, 40.678) -> (39, 24.678)
  line L17 (39, 24.678) -> (23, 24.678)
  line L18 (23, 24.678) -> (23, 40.678)
  circle A14 centre (44, -42.3125) radius 3.5
  line L19 (-54, -52.128) -> (-51, -52.128)
  dimension "d139" = 4
extrude "Extrude16" cut sketch "Sketch6" against normal blind 1 contours L7 L8 L9 L10 L14
equation "d4 = d3"
equation "d5 = d3"
equation "d6 = d3"
equation "d8 = d7"
equation "d9 = d7"
equation "d10 = d7"
equation "d11 = d7"
equation "d12 = d7"
equation "d13 = d7"
equation "d119 = d118"
